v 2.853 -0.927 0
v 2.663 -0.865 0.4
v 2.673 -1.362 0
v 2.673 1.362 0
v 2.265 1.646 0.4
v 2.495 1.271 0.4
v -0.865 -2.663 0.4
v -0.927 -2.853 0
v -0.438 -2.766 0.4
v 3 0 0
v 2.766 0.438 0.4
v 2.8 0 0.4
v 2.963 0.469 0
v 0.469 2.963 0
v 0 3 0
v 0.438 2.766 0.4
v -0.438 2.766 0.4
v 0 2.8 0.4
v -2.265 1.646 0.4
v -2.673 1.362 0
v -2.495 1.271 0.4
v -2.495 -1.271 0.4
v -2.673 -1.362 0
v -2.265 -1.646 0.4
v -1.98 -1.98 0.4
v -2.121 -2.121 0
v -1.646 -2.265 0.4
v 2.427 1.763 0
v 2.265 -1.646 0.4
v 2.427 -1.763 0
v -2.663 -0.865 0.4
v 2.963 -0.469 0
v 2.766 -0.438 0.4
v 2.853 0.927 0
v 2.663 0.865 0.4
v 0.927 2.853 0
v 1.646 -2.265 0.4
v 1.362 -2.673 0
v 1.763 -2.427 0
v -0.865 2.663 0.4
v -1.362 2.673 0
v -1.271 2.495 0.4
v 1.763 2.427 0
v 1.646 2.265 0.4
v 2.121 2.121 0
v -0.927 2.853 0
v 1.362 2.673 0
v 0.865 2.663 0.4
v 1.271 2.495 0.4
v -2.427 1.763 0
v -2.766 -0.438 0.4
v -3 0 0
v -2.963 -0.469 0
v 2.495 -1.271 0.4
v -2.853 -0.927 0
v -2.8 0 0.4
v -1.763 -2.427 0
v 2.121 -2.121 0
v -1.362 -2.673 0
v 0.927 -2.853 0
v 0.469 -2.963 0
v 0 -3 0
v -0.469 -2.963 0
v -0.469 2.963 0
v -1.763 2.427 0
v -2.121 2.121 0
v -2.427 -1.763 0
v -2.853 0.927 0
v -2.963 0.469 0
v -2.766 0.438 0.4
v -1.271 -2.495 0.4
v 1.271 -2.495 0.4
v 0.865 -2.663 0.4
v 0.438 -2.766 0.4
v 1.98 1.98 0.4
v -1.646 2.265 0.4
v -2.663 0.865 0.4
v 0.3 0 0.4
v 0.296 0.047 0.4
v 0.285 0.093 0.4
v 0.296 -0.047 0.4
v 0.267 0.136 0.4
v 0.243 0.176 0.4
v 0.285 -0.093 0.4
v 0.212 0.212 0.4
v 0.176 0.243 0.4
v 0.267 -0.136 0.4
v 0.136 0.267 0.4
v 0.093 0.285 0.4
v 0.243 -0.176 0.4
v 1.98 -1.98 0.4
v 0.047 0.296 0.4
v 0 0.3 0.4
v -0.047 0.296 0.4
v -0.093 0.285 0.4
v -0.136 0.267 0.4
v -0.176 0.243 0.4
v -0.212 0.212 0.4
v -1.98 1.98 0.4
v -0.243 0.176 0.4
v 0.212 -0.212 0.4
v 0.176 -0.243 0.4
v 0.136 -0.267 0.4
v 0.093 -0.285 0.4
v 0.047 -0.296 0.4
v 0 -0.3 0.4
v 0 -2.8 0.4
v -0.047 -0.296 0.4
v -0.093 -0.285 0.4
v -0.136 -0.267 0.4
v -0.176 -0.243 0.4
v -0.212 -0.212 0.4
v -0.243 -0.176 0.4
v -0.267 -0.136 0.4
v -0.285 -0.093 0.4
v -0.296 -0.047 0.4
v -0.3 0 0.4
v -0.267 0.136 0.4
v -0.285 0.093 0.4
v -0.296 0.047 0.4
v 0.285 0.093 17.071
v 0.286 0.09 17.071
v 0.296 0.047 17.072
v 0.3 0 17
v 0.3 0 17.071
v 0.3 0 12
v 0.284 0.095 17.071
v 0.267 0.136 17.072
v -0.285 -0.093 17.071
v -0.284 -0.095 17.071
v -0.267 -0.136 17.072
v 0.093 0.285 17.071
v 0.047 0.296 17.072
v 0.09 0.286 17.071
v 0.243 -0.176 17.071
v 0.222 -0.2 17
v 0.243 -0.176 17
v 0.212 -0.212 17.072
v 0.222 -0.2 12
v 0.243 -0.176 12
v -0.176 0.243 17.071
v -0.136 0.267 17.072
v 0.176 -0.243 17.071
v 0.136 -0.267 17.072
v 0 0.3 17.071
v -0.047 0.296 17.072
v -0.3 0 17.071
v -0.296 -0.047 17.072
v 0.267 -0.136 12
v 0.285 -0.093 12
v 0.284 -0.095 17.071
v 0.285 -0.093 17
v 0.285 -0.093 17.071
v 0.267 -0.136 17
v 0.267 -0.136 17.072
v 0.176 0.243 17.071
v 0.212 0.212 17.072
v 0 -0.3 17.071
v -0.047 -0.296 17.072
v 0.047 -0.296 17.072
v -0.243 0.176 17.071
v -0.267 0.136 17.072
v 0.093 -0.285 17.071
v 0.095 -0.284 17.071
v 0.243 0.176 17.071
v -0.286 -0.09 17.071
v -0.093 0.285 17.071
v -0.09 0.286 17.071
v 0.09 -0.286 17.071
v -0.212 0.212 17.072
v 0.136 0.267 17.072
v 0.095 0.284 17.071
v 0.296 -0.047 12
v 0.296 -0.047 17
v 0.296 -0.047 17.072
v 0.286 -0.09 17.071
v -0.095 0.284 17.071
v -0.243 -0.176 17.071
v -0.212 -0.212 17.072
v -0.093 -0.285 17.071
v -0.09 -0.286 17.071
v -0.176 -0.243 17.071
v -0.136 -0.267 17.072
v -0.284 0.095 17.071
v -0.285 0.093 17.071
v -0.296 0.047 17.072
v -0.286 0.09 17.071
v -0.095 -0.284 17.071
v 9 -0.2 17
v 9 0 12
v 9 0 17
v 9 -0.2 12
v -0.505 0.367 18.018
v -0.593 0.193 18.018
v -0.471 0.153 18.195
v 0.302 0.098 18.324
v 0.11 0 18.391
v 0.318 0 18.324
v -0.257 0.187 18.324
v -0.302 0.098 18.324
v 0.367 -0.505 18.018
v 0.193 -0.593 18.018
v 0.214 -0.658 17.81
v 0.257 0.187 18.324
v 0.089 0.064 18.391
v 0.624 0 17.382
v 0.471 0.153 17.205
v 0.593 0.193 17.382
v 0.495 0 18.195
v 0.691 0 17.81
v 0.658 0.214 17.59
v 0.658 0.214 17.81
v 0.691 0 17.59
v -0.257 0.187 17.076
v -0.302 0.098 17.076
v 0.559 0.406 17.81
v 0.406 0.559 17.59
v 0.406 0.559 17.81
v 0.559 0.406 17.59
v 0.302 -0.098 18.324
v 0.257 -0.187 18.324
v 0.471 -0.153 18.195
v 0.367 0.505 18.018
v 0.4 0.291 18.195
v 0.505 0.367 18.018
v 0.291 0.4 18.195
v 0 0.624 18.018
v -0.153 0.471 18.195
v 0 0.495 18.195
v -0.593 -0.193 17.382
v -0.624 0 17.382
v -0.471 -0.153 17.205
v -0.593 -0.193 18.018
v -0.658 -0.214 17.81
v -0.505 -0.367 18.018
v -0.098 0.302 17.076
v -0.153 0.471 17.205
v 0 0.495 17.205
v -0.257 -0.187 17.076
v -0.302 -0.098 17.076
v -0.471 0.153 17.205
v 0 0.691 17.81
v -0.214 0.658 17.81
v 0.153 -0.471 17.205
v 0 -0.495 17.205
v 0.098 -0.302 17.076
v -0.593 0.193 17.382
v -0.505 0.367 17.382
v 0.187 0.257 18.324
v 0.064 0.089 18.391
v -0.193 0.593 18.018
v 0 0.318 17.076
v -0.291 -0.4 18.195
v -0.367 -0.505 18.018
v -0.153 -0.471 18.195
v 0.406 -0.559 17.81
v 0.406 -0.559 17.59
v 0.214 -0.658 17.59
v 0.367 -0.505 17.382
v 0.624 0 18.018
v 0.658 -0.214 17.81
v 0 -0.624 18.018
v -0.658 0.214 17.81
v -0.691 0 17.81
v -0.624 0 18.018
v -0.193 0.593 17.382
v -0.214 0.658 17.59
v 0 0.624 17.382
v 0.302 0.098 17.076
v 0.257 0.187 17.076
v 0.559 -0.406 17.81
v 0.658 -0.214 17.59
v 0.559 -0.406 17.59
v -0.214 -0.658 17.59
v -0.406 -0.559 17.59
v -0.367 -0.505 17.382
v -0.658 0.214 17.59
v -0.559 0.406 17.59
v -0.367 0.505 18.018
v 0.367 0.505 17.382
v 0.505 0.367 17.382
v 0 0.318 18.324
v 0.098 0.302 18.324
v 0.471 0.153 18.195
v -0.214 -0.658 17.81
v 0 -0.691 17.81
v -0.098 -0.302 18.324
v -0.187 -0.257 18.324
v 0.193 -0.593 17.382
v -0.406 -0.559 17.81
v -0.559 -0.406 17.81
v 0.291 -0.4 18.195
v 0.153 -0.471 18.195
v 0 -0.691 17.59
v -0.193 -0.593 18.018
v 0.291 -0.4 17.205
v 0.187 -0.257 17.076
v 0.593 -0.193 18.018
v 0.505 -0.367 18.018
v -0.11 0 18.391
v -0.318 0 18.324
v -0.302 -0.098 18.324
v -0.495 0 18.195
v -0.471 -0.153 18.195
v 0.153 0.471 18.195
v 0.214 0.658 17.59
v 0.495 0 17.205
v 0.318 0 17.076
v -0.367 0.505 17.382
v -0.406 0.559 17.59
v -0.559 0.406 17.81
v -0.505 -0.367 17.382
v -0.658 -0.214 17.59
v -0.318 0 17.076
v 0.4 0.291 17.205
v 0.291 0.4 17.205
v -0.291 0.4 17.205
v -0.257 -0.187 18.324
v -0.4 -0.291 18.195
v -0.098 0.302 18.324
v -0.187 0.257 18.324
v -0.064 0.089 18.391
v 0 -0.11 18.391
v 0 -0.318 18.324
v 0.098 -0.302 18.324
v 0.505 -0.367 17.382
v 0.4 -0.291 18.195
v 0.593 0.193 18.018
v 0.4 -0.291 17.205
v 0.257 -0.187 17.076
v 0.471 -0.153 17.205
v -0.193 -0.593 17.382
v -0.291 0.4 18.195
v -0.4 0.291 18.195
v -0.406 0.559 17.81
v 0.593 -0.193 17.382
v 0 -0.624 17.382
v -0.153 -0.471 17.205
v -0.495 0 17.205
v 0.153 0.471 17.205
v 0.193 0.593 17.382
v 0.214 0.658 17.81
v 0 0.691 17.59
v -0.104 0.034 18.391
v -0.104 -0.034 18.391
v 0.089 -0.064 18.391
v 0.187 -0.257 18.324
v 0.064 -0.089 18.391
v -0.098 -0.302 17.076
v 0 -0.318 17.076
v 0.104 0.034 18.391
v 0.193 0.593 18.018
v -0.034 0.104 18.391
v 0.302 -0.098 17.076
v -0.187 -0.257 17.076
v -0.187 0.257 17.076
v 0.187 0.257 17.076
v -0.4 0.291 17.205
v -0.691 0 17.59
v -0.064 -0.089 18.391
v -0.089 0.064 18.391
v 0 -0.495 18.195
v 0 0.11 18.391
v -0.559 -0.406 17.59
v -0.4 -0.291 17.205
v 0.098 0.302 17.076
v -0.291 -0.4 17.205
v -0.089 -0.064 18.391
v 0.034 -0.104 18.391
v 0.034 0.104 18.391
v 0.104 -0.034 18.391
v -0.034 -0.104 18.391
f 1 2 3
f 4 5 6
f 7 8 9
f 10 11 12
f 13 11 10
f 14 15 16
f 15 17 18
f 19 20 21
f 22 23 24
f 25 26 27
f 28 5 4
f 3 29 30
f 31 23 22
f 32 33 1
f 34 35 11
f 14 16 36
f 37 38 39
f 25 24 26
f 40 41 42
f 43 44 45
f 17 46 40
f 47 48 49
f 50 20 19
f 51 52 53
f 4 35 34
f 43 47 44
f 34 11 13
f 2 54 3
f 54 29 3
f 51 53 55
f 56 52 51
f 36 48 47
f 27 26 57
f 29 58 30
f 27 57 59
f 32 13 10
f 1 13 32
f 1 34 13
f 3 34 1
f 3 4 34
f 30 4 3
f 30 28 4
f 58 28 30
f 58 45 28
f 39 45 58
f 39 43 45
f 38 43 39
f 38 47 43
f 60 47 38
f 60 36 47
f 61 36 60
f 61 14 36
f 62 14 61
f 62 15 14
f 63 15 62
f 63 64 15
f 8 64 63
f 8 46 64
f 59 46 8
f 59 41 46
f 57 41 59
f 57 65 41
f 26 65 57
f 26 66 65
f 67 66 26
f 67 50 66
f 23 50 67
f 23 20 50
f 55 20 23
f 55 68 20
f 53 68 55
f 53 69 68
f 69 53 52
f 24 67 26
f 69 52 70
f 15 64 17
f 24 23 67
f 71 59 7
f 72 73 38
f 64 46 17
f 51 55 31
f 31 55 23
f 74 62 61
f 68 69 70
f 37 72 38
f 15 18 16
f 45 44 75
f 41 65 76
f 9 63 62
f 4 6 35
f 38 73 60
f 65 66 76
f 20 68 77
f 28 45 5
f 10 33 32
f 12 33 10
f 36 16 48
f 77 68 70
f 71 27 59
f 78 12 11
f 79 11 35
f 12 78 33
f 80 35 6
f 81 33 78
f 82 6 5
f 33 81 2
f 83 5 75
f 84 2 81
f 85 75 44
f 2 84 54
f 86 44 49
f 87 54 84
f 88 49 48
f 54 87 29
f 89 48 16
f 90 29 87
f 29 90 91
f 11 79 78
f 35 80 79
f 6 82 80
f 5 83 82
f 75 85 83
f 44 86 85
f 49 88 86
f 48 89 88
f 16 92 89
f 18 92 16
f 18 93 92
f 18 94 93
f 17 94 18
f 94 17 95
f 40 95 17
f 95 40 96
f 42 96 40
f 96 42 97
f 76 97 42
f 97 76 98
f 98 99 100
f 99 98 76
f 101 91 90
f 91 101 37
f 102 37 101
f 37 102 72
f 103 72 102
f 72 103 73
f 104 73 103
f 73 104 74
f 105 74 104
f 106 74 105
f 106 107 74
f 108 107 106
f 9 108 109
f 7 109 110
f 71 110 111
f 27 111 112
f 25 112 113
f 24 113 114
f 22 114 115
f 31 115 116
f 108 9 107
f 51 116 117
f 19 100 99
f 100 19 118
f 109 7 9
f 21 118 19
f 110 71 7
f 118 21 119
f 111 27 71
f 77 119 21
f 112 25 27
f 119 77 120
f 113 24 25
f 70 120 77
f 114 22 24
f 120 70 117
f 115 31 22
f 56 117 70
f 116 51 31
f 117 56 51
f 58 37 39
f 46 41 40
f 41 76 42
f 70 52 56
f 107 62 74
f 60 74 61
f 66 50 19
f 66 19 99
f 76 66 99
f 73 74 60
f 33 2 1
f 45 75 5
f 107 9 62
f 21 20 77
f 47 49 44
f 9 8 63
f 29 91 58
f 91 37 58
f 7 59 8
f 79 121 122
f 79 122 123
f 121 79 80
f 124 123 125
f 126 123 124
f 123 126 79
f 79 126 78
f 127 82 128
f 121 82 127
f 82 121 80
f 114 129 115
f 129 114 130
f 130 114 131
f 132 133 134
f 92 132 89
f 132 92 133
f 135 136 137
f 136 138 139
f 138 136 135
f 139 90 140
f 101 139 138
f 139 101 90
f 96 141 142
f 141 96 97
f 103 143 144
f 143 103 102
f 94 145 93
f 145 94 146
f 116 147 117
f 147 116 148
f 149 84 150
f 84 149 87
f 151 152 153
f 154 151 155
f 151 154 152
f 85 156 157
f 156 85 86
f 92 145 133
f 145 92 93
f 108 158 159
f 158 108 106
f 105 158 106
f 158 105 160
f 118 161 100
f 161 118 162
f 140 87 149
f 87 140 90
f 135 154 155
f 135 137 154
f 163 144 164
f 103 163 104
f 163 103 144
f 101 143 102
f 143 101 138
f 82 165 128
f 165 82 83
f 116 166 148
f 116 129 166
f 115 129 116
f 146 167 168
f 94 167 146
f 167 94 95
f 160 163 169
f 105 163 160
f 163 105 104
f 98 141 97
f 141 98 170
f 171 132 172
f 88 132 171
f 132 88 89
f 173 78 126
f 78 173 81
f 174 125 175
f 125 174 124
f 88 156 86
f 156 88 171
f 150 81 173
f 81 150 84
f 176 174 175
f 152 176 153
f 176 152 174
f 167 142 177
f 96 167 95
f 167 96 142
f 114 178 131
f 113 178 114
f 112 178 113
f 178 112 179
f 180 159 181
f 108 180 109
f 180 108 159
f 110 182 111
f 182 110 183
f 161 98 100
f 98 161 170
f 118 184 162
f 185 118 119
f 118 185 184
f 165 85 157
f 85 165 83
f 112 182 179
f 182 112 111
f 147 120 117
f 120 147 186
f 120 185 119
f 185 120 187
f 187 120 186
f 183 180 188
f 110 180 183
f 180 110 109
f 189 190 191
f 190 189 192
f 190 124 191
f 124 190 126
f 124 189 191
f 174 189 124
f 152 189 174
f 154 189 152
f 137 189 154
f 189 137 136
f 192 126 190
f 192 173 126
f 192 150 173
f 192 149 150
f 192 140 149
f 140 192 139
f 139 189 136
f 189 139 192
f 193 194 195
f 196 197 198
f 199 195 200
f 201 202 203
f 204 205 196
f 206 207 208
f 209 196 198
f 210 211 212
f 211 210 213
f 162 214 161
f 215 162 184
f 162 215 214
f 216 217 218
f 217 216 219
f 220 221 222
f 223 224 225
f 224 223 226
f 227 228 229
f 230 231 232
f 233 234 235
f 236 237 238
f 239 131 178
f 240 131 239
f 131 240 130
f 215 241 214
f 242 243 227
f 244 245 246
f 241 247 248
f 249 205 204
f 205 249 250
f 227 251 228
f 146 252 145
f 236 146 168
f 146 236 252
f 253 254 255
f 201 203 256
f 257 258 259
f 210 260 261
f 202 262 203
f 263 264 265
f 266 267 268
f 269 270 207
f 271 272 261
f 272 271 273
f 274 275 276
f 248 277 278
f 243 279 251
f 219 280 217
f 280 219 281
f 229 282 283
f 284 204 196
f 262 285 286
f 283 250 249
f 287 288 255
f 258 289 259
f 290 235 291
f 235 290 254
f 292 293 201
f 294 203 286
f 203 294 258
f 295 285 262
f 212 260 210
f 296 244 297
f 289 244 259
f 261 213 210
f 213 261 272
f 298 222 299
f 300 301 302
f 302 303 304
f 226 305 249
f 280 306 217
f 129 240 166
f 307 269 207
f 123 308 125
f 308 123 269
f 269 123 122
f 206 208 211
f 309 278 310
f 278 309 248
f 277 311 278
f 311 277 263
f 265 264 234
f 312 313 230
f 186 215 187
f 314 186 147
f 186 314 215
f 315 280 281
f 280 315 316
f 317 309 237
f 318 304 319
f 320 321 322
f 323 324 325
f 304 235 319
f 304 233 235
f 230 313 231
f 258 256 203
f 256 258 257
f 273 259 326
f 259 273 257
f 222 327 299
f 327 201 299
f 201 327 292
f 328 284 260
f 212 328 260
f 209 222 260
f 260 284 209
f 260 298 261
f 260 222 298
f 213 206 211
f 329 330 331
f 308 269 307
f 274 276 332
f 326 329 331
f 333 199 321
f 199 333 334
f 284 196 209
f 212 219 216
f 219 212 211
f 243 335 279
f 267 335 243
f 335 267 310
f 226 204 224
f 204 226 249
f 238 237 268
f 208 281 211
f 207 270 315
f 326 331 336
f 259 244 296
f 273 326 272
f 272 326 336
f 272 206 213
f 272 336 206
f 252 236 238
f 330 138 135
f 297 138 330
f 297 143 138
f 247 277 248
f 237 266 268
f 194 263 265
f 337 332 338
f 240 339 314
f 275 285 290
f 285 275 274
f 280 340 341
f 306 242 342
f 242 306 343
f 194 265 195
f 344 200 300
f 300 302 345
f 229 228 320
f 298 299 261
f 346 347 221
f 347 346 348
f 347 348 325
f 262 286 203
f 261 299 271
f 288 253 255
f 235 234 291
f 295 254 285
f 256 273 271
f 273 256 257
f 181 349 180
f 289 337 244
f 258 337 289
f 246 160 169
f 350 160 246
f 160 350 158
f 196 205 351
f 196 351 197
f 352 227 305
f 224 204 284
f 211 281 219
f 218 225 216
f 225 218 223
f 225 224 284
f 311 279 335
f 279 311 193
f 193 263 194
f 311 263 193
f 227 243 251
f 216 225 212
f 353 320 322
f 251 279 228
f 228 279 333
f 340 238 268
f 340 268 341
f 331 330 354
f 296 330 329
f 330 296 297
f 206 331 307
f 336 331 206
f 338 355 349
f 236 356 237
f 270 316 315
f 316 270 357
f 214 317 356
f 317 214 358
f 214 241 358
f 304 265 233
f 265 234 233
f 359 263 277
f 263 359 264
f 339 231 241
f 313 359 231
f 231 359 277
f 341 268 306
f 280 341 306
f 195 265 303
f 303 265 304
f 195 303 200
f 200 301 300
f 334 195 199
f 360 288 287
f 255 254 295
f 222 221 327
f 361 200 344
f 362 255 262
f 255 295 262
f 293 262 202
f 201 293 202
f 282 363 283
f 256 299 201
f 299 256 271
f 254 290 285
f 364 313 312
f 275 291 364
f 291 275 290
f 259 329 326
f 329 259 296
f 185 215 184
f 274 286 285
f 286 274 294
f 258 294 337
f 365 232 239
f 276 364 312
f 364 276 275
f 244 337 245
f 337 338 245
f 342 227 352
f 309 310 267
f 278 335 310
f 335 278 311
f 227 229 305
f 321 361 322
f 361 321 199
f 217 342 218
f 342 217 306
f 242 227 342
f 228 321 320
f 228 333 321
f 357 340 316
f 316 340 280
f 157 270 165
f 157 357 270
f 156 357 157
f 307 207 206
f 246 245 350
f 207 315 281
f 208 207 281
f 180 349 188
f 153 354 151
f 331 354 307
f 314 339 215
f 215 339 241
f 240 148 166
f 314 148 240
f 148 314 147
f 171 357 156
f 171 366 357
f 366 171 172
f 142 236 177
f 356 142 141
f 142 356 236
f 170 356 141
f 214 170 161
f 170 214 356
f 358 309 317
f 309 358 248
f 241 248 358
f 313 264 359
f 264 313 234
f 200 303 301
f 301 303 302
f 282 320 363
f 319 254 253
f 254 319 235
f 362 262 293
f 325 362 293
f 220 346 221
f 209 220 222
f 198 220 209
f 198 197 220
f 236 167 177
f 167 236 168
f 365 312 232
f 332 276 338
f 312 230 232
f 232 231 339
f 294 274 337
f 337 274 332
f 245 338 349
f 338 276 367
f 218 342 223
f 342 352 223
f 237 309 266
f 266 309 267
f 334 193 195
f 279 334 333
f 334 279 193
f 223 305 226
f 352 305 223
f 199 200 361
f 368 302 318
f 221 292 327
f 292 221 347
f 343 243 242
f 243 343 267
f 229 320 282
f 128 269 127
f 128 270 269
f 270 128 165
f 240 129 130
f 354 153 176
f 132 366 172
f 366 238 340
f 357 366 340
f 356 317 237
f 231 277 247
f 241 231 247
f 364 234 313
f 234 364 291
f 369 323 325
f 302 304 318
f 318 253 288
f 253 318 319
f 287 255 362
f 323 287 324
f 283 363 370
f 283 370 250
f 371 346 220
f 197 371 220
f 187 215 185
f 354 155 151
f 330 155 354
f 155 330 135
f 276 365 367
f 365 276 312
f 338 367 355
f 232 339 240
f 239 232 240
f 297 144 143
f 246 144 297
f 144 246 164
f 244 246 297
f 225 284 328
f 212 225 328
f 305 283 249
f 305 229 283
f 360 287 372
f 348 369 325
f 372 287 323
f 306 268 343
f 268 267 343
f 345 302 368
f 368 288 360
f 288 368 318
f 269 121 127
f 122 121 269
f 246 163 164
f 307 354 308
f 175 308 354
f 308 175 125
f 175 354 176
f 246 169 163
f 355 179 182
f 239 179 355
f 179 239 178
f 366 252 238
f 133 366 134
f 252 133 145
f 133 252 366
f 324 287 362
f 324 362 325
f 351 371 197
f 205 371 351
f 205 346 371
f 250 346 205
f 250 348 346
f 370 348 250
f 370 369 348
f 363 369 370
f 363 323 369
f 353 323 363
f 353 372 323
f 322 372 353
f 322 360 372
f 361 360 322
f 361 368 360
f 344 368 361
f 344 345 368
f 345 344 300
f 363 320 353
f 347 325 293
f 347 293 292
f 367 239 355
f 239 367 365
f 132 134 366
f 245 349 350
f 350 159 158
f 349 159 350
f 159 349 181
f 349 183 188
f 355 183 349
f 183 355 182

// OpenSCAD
color("gray"){
cylinder(0.4,3,2.8, $fn =40);

translate([0,0,0.3])
cylinder(17,0.3,0.3, $fn = 40);

}

color("gray")

translate([0,0,17.7], $fn = 20)
sphere(r =0.7);


translate([0,0,12])

rotate([90,0,0]){

color("gray")
cube([9,5,0.1]);

color("blue")
translate([0,0,0.1])
cube([3,5,0.1]);

color("white")
translate([3,0,0.1])
cube([3,5,0.1]);


color("red")
translate([6,0,0.1])
cube([3,5,0.1]);


}
